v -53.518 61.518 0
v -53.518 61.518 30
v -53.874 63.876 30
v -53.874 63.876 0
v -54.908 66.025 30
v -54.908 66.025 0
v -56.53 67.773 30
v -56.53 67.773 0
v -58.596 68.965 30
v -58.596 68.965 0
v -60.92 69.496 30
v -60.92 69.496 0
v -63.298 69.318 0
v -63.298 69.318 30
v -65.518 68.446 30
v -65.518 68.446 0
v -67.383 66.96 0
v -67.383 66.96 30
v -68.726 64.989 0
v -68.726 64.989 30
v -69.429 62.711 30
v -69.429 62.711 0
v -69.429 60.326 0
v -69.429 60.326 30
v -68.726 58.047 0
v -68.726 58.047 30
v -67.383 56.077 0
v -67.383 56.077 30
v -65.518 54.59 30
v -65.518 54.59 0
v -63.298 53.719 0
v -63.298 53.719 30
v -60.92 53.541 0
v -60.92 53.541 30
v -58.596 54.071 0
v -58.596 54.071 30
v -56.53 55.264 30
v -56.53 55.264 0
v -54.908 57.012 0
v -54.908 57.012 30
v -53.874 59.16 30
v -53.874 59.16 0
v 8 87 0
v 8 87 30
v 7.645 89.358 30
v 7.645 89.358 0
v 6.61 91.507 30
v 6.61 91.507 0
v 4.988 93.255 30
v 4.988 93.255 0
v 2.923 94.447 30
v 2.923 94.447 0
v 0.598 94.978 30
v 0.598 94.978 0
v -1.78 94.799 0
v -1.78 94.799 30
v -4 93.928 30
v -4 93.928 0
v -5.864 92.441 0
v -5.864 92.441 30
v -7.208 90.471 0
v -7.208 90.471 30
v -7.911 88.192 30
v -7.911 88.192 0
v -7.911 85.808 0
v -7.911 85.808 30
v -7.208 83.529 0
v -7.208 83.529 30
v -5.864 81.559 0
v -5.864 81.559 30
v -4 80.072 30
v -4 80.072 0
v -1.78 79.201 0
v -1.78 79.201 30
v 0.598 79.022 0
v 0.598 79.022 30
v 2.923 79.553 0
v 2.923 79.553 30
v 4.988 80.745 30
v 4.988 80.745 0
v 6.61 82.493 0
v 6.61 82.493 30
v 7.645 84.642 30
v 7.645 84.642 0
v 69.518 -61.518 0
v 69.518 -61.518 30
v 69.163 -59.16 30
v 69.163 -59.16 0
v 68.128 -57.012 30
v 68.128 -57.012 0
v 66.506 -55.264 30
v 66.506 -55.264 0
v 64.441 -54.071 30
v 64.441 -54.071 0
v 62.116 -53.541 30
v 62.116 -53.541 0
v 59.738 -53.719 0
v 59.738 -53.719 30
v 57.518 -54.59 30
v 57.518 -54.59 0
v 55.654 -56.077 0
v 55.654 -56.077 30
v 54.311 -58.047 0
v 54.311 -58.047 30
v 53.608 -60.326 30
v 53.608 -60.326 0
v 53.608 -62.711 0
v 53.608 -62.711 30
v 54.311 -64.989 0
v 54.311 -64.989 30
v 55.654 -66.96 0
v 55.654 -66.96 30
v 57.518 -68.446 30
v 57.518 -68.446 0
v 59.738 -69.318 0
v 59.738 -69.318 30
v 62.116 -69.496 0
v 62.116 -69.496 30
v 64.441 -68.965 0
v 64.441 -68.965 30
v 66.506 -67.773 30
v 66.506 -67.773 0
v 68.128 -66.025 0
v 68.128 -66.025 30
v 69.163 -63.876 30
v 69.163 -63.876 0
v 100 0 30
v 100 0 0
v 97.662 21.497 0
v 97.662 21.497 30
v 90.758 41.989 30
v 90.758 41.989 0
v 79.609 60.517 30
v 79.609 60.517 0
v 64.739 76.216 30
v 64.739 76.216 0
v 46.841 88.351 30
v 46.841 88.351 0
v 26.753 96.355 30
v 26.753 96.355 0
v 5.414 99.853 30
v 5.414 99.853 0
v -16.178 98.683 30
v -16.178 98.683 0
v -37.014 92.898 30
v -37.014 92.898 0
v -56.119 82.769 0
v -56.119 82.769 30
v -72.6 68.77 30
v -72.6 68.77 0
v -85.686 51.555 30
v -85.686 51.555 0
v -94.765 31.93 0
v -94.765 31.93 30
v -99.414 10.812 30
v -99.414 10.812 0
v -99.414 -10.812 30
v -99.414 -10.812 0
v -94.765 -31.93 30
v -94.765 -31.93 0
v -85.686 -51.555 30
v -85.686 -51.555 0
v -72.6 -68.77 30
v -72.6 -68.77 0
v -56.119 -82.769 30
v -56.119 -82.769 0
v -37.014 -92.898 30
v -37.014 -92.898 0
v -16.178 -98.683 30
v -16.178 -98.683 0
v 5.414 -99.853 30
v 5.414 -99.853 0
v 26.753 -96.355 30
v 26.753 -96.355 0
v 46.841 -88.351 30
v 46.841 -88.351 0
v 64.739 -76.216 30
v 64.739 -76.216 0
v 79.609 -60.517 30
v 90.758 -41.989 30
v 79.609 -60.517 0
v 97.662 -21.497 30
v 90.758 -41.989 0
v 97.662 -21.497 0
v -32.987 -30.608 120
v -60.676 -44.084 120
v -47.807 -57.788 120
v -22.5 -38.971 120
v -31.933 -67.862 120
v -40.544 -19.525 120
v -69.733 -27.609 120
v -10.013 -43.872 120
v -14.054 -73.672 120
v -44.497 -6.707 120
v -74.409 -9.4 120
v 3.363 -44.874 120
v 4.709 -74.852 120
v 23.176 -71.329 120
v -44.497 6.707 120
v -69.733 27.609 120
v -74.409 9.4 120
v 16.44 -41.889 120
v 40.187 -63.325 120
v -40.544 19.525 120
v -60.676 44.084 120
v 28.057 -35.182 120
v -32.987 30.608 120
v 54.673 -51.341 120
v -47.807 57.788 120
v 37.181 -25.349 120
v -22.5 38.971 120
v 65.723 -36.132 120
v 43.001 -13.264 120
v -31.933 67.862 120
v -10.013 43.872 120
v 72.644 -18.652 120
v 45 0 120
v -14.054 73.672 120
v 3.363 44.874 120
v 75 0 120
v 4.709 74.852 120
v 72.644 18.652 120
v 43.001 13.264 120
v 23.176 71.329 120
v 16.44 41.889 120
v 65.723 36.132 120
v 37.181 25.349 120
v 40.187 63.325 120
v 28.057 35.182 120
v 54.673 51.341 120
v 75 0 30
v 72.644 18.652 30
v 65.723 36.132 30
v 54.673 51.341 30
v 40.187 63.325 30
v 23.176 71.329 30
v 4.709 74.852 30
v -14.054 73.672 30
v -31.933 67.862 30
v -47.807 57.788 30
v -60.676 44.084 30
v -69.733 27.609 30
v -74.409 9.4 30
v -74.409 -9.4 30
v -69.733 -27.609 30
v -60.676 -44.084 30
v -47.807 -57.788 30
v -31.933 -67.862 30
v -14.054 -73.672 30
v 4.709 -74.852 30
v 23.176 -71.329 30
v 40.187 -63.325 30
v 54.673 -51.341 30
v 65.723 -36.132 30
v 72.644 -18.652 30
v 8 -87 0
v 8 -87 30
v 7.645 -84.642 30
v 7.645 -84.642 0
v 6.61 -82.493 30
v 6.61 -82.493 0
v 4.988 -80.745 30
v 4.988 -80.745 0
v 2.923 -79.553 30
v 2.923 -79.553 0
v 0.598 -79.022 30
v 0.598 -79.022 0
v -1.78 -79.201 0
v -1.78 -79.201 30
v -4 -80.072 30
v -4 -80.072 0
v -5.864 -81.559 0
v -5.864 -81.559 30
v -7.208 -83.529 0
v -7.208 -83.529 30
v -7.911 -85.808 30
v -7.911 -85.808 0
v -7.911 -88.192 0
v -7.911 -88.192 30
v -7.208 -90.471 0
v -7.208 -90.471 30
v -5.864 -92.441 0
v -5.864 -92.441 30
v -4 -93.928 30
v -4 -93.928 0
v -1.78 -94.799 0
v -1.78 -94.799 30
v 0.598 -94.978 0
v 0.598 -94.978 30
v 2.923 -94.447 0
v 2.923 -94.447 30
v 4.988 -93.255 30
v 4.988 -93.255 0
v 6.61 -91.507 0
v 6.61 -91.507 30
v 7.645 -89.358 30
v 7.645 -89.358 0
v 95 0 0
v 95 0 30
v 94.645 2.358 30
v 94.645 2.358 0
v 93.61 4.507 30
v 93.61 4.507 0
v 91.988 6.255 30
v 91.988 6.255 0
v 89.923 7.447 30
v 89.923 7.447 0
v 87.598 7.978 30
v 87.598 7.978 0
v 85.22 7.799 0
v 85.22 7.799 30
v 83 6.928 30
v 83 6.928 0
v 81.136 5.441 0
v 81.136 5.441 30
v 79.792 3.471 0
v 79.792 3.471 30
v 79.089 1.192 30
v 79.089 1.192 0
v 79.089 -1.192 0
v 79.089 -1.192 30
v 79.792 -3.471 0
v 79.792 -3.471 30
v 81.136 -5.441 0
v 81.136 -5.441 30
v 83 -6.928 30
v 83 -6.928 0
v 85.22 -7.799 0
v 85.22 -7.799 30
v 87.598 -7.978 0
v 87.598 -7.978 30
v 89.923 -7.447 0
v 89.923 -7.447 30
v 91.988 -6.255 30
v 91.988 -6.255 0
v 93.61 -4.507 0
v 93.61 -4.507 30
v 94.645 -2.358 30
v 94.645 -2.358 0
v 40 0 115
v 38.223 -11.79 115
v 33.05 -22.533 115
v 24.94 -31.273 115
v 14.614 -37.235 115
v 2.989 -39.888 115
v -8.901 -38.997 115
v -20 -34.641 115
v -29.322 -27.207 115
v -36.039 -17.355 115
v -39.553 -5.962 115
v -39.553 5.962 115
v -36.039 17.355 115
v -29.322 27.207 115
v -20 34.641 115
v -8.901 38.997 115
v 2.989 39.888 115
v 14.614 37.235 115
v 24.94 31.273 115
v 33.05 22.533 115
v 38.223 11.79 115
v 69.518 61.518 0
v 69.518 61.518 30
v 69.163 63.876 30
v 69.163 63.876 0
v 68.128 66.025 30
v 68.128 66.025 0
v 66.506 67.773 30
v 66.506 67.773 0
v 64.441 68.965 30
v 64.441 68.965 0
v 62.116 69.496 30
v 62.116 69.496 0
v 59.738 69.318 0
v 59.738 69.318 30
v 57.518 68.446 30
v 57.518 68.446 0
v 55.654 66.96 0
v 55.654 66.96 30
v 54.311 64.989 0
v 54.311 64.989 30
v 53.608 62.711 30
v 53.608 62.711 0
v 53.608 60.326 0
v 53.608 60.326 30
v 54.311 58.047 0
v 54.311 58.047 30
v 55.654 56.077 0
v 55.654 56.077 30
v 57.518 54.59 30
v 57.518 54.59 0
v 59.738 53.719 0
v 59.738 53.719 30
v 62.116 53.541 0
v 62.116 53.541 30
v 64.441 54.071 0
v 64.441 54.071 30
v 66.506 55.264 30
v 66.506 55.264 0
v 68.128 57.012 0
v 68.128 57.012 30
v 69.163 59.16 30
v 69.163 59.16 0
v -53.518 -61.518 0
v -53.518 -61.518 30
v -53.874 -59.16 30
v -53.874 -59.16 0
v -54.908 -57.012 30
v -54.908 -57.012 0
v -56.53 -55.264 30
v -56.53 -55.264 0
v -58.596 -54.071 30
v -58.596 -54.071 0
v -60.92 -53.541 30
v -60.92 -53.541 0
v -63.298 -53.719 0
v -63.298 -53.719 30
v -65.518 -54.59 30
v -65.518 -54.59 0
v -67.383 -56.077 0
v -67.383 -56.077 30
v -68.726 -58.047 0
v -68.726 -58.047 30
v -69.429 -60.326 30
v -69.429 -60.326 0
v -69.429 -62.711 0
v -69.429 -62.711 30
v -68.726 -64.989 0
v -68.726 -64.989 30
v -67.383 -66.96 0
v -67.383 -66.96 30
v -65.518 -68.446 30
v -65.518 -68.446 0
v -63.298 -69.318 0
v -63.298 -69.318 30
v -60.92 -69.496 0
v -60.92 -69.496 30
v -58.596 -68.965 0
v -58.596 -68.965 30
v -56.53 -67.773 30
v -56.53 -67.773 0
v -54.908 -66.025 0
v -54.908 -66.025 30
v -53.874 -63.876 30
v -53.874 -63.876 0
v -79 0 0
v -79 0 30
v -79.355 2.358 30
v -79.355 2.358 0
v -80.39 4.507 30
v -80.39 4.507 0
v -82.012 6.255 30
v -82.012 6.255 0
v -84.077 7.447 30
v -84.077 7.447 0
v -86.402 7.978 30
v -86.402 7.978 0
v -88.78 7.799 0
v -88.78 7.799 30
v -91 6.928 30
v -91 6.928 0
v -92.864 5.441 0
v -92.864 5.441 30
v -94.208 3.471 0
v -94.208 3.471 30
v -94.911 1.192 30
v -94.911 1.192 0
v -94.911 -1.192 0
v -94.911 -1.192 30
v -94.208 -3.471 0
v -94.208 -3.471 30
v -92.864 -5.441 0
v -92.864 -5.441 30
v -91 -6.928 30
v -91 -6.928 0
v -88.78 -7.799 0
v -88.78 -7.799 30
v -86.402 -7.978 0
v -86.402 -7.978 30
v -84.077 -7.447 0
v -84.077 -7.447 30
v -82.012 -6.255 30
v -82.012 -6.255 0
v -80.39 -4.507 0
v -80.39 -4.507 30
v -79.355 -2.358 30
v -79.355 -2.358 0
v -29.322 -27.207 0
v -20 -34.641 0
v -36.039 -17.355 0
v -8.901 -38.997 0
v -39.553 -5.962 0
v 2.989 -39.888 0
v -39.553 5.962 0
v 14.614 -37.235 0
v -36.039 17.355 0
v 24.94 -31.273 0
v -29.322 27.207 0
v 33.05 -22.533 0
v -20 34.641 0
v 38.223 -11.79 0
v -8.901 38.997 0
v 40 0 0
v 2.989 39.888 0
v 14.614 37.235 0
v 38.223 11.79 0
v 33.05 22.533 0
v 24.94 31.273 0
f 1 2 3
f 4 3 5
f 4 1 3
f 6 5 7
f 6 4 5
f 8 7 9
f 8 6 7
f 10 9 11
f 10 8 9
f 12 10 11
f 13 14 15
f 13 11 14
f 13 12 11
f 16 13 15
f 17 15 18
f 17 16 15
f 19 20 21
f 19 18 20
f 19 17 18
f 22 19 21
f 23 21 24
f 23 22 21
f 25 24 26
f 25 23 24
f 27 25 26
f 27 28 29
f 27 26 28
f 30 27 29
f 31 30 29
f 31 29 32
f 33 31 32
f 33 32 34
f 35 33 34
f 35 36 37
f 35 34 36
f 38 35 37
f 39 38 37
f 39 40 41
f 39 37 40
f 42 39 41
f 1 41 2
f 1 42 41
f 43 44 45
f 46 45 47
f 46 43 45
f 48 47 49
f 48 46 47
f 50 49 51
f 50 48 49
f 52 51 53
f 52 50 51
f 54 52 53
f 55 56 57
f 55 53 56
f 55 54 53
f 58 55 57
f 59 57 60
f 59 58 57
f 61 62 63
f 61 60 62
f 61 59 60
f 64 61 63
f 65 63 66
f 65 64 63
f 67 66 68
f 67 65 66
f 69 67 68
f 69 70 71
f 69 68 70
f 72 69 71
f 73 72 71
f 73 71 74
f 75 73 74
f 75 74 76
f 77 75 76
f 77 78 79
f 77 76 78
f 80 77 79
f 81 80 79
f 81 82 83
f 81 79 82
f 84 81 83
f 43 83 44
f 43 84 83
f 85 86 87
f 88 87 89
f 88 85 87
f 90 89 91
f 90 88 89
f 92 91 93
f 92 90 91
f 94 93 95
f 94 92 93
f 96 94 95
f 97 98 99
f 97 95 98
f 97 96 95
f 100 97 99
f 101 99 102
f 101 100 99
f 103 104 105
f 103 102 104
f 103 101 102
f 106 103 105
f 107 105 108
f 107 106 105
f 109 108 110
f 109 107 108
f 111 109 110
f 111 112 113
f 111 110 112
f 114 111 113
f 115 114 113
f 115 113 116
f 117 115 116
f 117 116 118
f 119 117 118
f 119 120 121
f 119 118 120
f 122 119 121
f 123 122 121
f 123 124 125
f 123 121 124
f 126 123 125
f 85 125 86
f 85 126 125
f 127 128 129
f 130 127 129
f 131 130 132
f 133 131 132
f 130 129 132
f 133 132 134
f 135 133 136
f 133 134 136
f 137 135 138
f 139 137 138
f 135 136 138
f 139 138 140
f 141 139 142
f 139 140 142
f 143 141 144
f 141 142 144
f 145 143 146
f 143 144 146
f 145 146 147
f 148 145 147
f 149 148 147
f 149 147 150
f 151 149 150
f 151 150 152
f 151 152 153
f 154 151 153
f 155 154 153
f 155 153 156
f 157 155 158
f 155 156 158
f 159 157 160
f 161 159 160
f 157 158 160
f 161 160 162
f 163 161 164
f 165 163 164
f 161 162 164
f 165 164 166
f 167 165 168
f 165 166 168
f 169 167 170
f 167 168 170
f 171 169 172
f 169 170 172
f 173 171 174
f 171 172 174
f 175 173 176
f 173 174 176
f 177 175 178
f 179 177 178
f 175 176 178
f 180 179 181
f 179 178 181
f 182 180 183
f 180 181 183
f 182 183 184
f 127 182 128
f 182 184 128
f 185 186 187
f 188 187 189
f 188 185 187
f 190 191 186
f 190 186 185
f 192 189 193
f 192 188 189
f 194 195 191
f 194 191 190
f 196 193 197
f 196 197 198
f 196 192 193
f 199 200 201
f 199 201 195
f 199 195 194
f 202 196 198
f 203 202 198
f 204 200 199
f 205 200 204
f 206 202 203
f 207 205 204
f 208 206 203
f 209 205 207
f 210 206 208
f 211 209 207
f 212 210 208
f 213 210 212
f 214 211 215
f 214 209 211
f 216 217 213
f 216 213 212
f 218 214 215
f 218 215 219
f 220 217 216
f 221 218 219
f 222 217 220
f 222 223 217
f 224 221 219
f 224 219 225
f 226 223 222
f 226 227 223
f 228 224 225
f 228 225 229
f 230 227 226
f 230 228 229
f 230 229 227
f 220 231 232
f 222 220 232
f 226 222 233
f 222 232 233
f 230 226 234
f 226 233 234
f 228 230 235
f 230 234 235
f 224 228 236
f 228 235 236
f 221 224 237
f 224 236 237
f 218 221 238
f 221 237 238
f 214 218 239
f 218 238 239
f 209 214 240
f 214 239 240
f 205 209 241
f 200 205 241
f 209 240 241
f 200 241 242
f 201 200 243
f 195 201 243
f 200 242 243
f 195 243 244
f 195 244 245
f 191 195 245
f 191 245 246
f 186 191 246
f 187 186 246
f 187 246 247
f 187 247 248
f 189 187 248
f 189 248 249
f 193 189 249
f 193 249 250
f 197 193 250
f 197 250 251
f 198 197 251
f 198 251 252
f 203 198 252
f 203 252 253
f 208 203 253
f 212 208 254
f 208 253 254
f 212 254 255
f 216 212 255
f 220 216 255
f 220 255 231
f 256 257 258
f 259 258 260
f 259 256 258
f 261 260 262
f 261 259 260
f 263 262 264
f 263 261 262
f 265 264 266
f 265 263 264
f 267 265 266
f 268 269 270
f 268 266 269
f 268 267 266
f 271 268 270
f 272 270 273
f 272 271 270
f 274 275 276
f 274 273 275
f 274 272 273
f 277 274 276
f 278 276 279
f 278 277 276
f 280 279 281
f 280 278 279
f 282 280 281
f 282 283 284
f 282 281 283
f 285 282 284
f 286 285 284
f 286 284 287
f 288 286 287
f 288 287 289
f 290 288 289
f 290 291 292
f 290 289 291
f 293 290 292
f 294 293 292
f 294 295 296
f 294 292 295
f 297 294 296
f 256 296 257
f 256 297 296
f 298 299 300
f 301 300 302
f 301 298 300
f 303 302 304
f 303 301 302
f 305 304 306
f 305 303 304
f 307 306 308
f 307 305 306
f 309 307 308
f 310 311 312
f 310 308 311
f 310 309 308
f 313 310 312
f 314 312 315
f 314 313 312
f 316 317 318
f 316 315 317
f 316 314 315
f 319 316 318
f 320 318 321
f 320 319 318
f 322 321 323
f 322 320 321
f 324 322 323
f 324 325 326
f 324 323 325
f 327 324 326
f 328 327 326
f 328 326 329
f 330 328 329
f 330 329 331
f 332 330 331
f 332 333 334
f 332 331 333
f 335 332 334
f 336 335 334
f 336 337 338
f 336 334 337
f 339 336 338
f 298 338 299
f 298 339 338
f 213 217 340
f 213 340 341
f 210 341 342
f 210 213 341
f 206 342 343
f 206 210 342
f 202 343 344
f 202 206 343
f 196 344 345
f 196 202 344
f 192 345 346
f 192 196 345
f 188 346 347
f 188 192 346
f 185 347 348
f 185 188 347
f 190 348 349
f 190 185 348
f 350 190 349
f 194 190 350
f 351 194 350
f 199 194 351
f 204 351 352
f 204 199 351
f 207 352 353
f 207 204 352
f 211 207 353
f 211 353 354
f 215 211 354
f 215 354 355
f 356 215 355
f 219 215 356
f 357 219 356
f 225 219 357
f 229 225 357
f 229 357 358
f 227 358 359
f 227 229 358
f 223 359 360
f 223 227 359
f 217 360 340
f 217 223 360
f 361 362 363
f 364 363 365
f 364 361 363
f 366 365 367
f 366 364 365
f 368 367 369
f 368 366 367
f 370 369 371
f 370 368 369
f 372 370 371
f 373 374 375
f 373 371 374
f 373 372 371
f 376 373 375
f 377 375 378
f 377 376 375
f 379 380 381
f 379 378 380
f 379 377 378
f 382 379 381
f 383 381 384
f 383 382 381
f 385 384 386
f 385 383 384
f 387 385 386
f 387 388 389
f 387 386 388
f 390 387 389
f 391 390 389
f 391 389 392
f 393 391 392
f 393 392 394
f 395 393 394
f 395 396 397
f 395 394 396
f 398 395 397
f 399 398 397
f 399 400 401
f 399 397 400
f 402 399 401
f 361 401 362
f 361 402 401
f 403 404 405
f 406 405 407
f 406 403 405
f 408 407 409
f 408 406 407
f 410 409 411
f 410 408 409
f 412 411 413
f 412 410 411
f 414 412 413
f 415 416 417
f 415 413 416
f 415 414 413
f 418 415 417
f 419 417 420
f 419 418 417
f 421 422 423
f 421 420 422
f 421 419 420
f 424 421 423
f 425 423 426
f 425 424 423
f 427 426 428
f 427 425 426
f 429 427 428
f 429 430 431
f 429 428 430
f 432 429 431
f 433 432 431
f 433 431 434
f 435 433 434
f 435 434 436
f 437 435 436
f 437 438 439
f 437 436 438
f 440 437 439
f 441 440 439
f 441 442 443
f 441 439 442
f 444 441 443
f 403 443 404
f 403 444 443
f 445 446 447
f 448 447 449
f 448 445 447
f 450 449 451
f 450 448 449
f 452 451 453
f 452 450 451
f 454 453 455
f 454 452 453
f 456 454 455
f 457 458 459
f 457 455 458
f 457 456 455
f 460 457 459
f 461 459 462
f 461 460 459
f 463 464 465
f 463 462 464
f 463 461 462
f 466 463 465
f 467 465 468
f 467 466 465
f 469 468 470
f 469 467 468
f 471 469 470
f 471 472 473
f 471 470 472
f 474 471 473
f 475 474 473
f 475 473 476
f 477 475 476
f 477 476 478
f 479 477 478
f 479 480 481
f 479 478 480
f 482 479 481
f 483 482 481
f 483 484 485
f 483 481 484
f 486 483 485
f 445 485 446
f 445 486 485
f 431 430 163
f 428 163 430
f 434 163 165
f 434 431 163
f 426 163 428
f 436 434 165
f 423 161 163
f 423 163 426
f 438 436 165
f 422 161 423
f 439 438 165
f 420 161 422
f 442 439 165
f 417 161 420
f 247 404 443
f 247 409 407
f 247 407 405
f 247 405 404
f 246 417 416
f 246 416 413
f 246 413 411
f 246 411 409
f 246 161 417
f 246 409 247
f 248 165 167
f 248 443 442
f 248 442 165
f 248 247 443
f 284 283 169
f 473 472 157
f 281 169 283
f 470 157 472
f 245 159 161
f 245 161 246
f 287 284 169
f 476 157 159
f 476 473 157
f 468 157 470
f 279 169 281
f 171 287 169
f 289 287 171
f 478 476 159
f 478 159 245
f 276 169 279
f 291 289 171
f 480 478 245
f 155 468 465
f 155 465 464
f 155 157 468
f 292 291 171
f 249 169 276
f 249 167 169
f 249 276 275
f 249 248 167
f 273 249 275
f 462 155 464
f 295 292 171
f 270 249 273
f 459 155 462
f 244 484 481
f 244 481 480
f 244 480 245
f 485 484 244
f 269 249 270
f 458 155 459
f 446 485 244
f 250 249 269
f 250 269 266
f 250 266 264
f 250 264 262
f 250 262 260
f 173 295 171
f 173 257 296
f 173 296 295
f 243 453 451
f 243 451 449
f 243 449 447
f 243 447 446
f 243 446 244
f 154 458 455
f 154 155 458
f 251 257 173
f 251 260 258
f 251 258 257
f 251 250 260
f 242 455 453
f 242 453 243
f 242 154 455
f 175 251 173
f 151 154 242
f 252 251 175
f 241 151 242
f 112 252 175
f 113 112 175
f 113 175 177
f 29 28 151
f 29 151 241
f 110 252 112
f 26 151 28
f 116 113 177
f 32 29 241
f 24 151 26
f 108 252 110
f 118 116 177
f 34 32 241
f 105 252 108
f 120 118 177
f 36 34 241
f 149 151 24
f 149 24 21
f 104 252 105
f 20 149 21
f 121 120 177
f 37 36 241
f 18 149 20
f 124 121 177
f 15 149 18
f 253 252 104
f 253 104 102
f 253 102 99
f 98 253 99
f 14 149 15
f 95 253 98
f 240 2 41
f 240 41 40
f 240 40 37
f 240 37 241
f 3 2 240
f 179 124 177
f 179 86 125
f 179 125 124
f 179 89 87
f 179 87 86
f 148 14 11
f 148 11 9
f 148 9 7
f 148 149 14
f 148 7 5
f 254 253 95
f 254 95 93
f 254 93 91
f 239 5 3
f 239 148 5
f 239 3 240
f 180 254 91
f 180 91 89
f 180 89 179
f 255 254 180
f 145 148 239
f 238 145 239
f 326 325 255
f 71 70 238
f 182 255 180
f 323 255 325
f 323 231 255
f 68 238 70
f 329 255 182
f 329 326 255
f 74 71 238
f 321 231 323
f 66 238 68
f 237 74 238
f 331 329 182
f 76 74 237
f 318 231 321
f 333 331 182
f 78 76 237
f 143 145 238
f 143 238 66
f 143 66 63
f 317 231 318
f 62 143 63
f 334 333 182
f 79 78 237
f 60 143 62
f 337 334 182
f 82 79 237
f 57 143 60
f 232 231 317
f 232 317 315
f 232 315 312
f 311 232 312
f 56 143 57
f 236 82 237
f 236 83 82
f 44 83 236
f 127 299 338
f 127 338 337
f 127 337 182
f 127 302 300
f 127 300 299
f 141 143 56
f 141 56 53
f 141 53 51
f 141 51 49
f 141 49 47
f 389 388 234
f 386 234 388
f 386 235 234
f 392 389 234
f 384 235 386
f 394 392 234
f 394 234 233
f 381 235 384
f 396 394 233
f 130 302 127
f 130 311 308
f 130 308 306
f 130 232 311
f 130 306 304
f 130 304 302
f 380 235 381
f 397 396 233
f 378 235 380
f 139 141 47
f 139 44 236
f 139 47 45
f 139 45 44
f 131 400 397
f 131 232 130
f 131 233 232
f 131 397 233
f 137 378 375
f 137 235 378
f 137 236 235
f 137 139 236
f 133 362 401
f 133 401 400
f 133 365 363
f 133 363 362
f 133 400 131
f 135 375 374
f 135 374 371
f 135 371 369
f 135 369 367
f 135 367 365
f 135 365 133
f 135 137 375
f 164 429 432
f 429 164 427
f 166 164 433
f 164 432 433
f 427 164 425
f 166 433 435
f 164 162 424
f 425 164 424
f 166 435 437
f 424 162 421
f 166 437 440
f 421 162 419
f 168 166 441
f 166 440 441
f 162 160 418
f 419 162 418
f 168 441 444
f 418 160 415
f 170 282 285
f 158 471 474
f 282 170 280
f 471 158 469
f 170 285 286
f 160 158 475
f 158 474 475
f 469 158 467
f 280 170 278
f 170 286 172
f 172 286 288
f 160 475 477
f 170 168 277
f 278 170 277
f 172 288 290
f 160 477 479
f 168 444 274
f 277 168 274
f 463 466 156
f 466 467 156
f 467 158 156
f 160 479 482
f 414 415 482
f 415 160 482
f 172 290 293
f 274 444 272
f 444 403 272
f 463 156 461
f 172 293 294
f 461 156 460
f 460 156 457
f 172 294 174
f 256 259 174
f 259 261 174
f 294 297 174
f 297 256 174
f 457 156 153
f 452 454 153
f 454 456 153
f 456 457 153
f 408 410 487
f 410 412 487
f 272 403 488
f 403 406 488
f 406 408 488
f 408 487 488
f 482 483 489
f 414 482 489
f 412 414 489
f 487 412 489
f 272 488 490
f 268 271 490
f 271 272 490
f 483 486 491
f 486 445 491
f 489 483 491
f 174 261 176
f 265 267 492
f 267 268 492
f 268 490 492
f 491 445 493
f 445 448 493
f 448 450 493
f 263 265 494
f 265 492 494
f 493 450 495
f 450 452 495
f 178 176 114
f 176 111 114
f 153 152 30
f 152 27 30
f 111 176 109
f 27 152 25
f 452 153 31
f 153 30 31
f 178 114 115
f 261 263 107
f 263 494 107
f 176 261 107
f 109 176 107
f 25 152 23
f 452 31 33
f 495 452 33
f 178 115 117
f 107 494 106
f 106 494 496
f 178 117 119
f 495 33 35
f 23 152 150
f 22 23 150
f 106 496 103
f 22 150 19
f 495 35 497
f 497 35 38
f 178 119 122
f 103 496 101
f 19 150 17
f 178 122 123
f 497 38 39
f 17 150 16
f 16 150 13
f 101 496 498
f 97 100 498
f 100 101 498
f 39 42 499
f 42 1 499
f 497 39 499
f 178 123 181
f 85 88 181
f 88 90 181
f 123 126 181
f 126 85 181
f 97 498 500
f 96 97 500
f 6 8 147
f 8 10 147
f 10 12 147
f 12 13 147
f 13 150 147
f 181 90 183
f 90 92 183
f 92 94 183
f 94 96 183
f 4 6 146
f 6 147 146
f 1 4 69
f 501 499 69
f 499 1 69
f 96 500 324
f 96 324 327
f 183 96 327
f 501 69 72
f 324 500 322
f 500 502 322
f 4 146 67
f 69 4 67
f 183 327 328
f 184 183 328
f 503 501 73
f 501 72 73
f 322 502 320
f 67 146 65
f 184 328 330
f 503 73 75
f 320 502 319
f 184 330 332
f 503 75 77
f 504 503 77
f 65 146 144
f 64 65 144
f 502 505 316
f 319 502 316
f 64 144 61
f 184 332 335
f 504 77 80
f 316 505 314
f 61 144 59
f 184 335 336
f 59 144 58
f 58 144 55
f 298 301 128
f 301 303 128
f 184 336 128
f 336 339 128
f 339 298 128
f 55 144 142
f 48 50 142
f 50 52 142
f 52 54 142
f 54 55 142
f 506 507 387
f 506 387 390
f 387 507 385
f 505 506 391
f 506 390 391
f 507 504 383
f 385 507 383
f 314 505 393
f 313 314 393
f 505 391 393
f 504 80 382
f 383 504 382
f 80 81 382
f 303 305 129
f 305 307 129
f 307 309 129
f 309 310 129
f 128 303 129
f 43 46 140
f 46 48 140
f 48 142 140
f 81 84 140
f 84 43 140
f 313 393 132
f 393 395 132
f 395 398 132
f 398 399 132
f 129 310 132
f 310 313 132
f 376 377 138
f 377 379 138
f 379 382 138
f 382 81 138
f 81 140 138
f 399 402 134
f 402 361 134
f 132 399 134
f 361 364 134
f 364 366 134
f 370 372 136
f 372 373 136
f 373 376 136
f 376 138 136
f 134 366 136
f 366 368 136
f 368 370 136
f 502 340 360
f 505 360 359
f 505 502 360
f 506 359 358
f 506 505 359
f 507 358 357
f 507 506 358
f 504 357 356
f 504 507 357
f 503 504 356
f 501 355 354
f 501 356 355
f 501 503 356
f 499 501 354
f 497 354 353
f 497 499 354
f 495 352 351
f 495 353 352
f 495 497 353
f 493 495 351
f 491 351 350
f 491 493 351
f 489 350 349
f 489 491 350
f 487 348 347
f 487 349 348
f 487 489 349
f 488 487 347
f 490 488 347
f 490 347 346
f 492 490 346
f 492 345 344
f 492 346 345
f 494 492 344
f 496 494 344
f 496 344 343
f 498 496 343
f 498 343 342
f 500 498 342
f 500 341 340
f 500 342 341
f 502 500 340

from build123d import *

# Parameters (mm, degrees)
SKETCH_1_R          = 100
EXTRUDE_1_DEPTH     = 30
SKETCH_2_R          = 75
EXTRUDE_2_DEPTH     = 120
SKETCH_3_R          = 40
CUT_EXTRUDE_1_DEPTH = 186.47236991
SKETCH_4_R          = 8
CUT_EXTRUDE_2_DEPTH = 186.47236991
CHAMFER_1_SIZE      = 5


with BuildPart() as part:
    # 草图1 → 凸台-拉伸1 (new body)
    with BuildSketch(Plane.XY):
        Circle(SKETCH_1_R)
    extrude(amount=EXTRUDE_1_DEPTH)

    # 草图2 → 凸台-拉伸2 (add)
    with BuildSketch(Plane.XY):
        Circle(SKETCH_2_R)
    extrude(amount=EXTRUDE_2_DEPTH)

    # 草图3 → 切除-拉伸1 (cut, through all)
    with BuildSketch(Plane.XY):
        Circle(SKETCH_3_R)
    extrude(amount=CUT_EXTRUDE_1_DEPTH, mode=Mode.SUBTRACT)

    # 草图4 → 切除-拉伸2 (cut, through all)
    with BuildSketch(Plane.XY):
        with Locations((87, 0)):
            Circle(SKETCH_4_R)
        with Locations((61.518289963, 61.518289963)):
            Circle(SKETCH_4_R)
        with Locations((0, 87)):
            Circle(SKETCH_4_R)
        with Locations((-61.518289963, 61.518289963)):
            Circle(SKETCH_4_R)
        with Locations((-87, 0)):
            Circle(SKETCH_4_R)
        with Locations((-61.518289963, -61.518289963)):
            Circle(SKETCH_4_R)
        with Locations((0, -87)):
            Circle(SKETCH_4_R)
        with Locations((61.518289963, -61.518289963)):
            Circle(SKETCH_4_R)
    extrude(amount=CUT_EXTRUDE_2_DEPTH, mode=Mode.SUBTRACT)

    # 倒角1
    chamfer_1_edges = [part.edges().sort_by_distance(p)[0] for p in [
        (-40, 0, 120),
    ]]
    chamfer(chamfer_1_edges, length=CHAMFER_1_SIZE)


solid = part.part
